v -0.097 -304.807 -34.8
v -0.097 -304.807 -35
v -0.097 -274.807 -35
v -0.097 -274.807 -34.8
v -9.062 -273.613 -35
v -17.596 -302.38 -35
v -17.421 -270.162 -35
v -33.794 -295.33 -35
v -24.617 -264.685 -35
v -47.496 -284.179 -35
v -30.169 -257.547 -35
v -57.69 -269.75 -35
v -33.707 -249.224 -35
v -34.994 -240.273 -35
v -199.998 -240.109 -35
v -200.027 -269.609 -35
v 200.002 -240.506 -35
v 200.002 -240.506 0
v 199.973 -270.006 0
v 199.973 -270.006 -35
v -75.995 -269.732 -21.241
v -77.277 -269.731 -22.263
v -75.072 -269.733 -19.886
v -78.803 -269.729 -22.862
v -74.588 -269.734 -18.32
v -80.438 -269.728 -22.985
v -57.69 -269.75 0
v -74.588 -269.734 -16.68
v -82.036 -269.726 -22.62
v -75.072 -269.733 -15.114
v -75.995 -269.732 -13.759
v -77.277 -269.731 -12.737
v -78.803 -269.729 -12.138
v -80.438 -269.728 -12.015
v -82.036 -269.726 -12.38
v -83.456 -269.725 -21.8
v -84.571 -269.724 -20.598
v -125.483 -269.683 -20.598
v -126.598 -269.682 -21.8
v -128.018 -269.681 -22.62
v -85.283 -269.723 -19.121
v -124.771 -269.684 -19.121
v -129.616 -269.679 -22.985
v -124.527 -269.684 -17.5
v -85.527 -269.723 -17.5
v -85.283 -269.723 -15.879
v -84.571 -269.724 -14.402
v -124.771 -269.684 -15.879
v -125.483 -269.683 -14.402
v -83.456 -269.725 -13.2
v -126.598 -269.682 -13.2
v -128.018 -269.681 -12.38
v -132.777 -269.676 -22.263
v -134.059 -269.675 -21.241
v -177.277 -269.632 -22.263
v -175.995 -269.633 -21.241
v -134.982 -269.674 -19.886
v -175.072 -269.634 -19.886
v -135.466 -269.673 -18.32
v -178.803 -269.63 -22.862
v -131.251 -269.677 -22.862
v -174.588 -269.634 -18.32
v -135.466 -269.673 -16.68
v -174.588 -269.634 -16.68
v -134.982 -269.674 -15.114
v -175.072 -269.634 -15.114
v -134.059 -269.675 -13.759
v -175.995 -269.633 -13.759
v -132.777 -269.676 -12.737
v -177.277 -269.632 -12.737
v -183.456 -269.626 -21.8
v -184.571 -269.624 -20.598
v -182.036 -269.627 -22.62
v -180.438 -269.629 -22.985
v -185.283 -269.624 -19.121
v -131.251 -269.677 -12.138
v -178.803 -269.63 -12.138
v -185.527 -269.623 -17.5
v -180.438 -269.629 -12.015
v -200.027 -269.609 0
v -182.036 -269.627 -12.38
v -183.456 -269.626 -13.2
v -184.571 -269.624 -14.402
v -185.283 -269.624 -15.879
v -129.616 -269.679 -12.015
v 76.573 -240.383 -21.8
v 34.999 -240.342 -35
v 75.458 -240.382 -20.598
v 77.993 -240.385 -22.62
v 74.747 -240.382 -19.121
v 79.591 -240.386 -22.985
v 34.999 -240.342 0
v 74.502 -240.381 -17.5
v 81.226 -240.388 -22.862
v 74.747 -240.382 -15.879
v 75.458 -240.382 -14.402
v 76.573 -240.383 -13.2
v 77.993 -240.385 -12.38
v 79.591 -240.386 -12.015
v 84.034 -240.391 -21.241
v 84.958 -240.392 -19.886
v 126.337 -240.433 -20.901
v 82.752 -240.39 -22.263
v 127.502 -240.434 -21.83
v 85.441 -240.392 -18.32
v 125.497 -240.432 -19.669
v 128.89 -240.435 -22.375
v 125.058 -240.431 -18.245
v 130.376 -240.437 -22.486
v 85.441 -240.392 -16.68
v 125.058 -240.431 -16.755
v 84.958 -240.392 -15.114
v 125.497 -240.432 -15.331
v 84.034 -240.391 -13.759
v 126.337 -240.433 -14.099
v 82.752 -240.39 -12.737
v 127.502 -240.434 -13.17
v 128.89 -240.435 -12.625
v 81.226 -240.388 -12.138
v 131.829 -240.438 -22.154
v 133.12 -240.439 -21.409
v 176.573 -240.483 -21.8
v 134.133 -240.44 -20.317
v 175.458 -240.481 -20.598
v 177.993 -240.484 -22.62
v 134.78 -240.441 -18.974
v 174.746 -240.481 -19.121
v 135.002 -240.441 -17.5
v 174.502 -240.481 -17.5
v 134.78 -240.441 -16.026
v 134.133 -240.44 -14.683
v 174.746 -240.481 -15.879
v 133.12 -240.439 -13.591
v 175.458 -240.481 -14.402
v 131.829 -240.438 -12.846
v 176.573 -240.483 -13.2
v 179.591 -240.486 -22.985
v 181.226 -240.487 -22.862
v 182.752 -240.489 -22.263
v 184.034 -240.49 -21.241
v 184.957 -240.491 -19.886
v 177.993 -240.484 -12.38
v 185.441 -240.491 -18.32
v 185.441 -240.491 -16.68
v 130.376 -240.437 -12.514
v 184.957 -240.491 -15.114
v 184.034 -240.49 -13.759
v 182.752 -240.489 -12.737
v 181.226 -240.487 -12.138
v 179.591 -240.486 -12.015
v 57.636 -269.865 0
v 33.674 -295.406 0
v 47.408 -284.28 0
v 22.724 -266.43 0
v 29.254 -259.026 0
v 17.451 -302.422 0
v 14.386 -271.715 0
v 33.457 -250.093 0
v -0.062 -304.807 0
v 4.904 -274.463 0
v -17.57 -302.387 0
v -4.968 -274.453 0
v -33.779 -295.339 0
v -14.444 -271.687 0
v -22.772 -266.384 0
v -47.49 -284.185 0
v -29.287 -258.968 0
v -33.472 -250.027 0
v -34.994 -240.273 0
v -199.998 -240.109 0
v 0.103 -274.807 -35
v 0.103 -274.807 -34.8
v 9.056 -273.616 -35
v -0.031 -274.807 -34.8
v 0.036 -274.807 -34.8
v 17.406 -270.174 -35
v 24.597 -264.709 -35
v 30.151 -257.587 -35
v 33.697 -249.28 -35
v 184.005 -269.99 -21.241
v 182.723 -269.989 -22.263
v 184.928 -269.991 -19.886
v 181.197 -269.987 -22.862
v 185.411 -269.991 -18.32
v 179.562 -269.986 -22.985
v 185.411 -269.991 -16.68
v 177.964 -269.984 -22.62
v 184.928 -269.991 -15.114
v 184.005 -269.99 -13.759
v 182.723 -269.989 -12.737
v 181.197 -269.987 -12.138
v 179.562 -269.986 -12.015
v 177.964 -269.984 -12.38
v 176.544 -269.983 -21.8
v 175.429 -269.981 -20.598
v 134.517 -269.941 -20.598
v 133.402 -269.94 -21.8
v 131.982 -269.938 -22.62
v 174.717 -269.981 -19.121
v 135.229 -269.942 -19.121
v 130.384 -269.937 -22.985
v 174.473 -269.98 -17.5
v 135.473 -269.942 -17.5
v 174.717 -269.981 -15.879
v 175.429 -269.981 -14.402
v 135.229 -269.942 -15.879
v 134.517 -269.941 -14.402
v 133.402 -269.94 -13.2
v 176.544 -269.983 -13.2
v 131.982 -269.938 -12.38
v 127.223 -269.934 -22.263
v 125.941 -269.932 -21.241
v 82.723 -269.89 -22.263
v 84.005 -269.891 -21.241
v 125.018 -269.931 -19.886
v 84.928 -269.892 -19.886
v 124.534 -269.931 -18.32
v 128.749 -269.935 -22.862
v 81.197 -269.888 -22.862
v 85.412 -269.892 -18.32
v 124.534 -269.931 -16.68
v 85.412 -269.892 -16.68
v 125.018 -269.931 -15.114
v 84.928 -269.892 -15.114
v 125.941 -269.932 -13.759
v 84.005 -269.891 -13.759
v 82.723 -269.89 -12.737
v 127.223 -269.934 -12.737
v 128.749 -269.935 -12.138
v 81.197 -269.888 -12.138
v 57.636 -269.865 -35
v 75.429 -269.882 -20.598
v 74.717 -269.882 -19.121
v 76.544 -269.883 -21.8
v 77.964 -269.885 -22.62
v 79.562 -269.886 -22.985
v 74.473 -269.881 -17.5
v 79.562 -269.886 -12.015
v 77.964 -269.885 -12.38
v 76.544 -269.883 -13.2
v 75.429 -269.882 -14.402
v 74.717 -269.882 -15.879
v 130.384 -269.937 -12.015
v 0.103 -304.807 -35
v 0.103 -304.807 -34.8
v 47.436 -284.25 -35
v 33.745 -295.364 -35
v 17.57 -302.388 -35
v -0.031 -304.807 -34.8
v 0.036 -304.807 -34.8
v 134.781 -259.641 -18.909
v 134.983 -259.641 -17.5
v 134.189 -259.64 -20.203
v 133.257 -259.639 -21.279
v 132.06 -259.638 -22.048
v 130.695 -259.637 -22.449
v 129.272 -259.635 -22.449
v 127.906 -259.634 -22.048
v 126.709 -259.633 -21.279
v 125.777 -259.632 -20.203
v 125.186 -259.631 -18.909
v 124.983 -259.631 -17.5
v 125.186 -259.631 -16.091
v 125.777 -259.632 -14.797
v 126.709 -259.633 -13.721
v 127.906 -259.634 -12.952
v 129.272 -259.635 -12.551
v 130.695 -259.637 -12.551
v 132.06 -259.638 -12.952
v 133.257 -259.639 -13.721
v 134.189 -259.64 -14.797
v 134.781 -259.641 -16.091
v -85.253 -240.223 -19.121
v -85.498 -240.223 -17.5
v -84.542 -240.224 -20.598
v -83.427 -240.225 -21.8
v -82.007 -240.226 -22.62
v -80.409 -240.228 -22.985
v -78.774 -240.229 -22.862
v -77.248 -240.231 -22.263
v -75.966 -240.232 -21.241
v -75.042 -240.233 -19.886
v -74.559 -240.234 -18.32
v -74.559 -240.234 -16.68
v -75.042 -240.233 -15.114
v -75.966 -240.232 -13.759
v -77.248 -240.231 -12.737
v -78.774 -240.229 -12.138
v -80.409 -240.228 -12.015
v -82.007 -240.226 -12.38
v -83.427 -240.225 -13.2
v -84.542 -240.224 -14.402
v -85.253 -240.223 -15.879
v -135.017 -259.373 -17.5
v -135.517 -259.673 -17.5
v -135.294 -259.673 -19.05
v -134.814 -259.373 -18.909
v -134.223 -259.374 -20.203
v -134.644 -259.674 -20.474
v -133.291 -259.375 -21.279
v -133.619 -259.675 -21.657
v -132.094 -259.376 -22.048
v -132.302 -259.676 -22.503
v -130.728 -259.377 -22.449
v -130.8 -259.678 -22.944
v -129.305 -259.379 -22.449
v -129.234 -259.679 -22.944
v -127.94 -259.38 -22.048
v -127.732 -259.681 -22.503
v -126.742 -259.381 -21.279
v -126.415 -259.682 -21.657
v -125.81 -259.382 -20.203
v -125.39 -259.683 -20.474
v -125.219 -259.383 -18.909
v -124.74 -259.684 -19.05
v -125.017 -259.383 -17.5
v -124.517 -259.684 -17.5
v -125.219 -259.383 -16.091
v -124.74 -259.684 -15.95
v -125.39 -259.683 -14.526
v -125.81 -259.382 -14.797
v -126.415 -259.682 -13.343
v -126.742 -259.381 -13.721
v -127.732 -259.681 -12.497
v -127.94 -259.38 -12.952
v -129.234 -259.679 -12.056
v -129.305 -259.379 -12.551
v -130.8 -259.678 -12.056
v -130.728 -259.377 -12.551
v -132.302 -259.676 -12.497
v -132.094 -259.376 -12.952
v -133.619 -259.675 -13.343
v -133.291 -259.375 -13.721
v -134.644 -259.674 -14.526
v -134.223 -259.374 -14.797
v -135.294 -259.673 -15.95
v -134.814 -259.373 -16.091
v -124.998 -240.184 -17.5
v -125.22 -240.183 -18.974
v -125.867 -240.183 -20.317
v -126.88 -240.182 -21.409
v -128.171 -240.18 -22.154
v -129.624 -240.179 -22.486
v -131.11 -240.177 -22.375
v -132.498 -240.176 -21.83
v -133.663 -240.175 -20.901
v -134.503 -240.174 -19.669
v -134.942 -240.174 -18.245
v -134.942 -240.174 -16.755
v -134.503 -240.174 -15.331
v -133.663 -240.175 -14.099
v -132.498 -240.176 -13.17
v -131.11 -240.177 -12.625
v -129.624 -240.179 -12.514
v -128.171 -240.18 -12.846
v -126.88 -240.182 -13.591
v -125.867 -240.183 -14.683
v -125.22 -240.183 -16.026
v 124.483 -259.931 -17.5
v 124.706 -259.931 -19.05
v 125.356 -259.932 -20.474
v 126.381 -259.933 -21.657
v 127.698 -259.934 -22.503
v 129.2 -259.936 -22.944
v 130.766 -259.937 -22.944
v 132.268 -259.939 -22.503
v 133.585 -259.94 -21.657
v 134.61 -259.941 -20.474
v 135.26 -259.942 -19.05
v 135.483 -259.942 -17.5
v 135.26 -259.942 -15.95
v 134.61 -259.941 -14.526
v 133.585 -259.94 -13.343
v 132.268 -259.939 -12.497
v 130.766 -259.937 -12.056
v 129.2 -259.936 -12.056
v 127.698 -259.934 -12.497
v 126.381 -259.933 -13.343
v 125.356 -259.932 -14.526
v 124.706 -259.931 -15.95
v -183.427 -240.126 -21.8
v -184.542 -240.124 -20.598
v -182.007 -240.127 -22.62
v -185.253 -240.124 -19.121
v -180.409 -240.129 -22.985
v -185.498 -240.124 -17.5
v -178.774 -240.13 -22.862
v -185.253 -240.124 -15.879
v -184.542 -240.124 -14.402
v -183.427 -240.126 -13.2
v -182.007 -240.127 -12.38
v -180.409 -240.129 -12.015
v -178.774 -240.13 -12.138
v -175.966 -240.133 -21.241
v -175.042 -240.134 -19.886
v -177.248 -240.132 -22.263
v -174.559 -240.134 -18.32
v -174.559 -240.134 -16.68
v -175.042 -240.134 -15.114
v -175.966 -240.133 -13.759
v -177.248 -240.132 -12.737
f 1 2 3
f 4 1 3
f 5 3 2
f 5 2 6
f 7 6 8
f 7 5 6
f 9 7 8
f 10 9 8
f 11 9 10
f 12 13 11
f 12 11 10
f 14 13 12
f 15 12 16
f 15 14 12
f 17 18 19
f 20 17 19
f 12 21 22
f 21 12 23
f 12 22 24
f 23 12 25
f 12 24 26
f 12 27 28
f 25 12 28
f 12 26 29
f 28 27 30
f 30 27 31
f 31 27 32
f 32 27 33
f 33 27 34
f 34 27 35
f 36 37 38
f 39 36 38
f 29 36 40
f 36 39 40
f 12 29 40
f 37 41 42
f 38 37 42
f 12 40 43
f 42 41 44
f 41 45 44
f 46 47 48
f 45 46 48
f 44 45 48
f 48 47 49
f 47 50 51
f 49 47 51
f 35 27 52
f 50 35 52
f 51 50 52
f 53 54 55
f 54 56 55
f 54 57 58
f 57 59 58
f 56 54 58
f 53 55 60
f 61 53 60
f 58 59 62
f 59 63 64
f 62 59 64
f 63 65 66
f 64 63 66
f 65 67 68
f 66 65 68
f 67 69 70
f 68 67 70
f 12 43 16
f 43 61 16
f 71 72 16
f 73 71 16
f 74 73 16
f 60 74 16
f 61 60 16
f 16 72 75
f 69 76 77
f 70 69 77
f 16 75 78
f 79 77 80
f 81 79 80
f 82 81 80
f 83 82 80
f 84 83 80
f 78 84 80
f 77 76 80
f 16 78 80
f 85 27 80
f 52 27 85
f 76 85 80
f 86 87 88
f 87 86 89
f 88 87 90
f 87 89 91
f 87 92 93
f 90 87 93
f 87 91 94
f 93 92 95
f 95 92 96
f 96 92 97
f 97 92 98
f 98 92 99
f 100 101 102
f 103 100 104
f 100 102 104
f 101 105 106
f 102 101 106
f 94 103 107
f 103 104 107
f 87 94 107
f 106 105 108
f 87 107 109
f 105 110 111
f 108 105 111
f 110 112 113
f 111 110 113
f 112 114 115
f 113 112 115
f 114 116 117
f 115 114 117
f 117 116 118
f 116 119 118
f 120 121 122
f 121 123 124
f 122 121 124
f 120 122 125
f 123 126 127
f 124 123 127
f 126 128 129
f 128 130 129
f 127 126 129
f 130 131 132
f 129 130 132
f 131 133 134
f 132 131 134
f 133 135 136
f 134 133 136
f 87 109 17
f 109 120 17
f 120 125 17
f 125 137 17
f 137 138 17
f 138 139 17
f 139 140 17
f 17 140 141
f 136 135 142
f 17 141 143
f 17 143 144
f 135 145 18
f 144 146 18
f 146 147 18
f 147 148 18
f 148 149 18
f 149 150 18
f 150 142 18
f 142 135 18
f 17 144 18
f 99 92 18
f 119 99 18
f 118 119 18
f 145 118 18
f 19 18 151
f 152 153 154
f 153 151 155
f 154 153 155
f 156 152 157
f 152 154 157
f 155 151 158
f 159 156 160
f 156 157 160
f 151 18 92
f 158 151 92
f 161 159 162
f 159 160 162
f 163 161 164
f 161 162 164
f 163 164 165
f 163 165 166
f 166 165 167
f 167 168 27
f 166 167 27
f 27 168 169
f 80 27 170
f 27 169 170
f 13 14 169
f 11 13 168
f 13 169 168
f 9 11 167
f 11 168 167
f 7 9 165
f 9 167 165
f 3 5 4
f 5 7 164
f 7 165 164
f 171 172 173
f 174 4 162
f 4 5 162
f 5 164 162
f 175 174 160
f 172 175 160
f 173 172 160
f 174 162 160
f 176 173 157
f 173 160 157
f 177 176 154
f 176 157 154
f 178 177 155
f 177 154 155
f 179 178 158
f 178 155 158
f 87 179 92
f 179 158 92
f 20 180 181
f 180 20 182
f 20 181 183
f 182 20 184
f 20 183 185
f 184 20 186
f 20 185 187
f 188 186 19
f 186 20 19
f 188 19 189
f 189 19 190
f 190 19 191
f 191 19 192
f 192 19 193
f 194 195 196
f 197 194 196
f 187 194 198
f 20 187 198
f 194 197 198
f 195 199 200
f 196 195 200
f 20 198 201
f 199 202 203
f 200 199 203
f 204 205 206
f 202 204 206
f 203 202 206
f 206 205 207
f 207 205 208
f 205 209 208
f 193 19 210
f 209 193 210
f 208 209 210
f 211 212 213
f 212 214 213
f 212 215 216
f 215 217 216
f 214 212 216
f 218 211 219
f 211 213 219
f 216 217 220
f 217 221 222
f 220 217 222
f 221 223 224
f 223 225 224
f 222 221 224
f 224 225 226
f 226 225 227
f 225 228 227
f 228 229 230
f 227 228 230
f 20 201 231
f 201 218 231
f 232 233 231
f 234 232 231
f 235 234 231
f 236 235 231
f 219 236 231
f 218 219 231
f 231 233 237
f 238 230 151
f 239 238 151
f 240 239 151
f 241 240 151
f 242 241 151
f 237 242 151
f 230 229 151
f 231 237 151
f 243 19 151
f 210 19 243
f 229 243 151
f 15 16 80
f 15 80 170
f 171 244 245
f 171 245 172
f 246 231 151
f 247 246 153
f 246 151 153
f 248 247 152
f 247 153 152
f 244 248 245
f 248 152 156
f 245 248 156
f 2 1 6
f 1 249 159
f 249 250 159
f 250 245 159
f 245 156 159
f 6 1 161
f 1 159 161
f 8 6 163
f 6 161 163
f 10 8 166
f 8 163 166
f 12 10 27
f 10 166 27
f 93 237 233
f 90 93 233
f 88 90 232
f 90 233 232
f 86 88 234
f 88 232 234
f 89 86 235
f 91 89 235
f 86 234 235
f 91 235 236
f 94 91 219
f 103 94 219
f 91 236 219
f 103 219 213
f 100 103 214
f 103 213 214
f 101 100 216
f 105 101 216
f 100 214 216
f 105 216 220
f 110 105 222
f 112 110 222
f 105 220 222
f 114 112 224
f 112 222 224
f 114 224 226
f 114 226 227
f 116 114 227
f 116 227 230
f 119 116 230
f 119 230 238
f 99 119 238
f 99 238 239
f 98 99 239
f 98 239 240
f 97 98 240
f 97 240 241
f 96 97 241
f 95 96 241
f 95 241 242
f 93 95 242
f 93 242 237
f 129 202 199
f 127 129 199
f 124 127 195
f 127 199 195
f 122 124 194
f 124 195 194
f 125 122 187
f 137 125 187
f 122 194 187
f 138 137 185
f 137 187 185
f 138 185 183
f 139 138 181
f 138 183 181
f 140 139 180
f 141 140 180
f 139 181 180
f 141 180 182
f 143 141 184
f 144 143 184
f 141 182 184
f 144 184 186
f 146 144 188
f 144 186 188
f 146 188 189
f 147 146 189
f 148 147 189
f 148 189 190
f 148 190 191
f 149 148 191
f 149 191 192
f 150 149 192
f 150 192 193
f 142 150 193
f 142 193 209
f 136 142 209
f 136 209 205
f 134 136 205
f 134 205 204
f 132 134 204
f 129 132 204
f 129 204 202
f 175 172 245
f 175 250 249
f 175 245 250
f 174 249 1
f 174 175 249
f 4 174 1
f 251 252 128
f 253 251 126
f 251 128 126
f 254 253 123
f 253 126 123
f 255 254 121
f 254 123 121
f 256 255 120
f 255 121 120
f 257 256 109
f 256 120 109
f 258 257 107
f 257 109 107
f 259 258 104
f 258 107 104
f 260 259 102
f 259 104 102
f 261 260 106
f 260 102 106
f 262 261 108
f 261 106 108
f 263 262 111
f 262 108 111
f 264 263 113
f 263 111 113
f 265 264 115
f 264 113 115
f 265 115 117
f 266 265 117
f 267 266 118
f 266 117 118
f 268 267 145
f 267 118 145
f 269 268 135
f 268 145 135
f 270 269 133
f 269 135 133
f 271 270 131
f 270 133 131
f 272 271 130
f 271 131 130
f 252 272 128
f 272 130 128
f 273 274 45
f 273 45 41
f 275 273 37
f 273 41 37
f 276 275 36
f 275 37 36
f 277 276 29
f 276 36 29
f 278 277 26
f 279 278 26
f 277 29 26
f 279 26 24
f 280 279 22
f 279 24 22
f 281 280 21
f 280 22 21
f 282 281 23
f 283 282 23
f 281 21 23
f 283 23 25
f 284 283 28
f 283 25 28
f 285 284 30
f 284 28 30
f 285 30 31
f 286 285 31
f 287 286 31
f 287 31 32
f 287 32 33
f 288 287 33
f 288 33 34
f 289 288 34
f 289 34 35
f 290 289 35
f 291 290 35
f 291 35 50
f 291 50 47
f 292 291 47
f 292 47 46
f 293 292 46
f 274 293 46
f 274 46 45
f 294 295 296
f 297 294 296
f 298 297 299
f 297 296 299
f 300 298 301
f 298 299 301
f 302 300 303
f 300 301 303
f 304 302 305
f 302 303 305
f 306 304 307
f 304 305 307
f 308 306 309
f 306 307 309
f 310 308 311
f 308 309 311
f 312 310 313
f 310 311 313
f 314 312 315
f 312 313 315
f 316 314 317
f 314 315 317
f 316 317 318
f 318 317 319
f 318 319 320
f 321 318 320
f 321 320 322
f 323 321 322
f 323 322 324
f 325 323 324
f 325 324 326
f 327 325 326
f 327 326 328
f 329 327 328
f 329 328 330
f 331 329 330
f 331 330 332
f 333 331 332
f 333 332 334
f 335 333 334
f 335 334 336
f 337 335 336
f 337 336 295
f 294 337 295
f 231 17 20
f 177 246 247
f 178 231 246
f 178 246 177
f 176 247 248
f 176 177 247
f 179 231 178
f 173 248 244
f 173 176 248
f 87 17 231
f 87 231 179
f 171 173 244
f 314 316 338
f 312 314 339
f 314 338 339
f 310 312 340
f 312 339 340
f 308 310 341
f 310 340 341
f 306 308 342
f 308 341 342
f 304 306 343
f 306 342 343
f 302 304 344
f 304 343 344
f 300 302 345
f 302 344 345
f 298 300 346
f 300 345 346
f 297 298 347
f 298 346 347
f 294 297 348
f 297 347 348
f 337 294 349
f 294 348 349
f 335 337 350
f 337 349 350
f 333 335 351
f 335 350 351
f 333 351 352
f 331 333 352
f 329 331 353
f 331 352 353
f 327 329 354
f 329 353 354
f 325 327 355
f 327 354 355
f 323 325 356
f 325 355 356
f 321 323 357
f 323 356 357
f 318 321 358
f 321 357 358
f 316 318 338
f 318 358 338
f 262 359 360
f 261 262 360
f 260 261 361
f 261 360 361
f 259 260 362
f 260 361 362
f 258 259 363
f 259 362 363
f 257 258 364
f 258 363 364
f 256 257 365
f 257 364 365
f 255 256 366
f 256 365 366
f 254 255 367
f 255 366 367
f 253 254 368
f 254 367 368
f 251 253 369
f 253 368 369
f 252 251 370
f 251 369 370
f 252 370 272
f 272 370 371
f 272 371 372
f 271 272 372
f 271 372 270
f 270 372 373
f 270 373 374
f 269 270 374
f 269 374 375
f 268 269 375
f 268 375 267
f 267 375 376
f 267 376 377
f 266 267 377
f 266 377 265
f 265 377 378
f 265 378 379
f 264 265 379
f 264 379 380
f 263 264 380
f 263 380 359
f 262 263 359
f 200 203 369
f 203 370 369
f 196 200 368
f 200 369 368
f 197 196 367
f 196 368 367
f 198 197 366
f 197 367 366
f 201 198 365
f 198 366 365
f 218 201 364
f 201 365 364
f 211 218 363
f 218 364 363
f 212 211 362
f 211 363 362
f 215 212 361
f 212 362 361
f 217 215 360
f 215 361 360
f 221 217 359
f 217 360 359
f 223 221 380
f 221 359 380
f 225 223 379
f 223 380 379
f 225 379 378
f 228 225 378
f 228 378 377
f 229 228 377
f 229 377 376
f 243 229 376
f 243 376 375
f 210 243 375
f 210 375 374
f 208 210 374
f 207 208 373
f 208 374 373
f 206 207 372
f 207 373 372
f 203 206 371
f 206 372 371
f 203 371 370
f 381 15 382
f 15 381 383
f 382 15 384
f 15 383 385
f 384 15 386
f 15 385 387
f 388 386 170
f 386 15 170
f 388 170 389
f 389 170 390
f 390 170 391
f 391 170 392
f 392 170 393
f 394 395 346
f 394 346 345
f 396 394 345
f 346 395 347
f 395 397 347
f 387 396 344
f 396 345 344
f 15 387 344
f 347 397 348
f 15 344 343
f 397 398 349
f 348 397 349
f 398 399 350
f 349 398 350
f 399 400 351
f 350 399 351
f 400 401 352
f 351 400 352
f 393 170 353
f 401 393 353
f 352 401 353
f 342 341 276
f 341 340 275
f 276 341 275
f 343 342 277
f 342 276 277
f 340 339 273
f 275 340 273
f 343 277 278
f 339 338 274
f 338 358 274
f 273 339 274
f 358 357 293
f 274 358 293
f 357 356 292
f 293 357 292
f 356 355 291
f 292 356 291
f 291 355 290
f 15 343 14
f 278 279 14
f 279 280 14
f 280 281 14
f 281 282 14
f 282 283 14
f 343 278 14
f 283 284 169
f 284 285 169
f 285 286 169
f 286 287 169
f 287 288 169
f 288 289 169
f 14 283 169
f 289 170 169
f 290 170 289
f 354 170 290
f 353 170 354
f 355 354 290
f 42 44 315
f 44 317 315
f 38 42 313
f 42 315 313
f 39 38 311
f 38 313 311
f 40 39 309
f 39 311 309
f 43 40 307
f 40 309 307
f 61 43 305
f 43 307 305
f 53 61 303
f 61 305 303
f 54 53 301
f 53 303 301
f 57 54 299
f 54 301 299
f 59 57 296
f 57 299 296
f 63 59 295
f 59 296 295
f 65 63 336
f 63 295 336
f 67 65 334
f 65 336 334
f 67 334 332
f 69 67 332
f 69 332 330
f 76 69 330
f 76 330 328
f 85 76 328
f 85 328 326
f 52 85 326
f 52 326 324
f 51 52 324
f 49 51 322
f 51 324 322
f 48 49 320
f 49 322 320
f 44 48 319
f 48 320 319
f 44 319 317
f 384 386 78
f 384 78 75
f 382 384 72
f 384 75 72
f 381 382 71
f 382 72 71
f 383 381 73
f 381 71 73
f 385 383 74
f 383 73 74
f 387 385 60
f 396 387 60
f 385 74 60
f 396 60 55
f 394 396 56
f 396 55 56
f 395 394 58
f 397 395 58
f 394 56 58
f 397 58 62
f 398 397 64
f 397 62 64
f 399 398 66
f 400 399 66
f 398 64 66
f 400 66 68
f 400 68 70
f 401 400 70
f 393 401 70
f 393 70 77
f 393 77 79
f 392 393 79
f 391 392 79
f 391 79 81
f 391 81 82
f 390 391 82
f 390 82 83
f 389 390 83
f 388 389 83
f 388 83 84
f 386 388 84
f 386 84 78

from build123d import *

# Parameters (mm, degrees)
RESSALTO_EXTRUS_O1_DEPTH         = 35
FURO_DE_DI_METRO_11_0_11_1_D     = 11
FUROS_GUIA_COM_10_0MM1_D         = 10
FURO_DE_DI_METRO_11_0_11_2_D     = 11
FURO_DE_DI_METRO_11_0_11_2_DEPTH = 10
FURO_DE_DI_METRO_11_0_11_2_TIP   = 3.304733405
ESBO_O8_W                        = 0.2
ESBO_O8_H                        = 36.606458827
CORTE_EXTRUS_O1_DEPTH            = 0.2


with BuildPart() as part:
    # Esboço1 → Ressalto-extrusão1 (new body)
    with BuildSketch(Plane.XY):
        with BuildLine():
            Line((-199.997669575, -240.109131808), (-34.994179097, -240.27276126))
            ThreePointArc((-34.994179097, -240.27276126), (-0.031980607, -274.807449281), (34.998643265, -240.34217123))
            Line((34.998643265, -240.34217123), (200.002133743, -240.505800682))
            Line((200.002133743, -240.505800682), (199.972879413, -270.005786177))
            Line((199.972879413, -270.005786177), (57.635762375, -269.864634348))
            ThreePointArc((57.635762375, -269.864634348), (-0.061730772, -304.80743453), (-57.689806866, -269.750269132))
            Line((-57.689806866, -269.750269132), (-200.026923904, -269.609117302))
            Line((-200.026923904, -269.609117302), (-199.997669575, -240.109131808))
        make_face()
    extrude(amount=-RESSALTO_EXTRUS_O1_DEPTH)

    # Furo de diâmetro Ø11.0 (11)1 (through all)
    with Locations(Plane(origin=(-0.238306111, -240.30722771, 0), x_dir=(0.9999995082930158, -0.000991672187112085, 0), z_dir=(0.000991672187112085, 0.9999995082930158, 0))):
        with Locations((-179.759461687, 17.5), (-79.759461687, 17.5), (80.240538313, 17.5), (180.240538313, 17.5)):
            Hole(FURO_DE_DI_METRO_11_0_11_1_D / 2)

    # Furos-guia com Ø10.0mm1 (through all)
    with Locations(Plane(origin=(-0.267560441, -269.807213205, 0), x_dir=(-0.9999995082930158, 0.0009916721871120312, 0), z_dir=(-0.0009916721871120312, -0.9999995082930158, 0))):
        with Locations((129.759461687, 17.5), (-130.240538313, 17.5), (-221.181262437, -155.418379851)):
            Hole(FUROS_GUIA_COM_10_0MM1_D / 2)

    # Furo de diâmetro Ø11.0 (11)2
    with Locations(Plane(origin=(-0.267560441, -269.807213205, 0), x_dir=(-0.9999995082930158, 0.0009916721871120312, 0), z_dir=(-0.0009916721871120312, -0.9999995082930158, 0))):
        with Locations((129.759461687, 17.5), (-130.240538313, 17.5)):
            Hole(FURO_DE_DI_METRO_11_0_11_2_D / 2, depth=FURO_DE_DI_METRO_11_0_11_2_DEPTH)
            with Locations((0, 0, -(FURO_DE_DI_METRO_11_0_11_2_DEPTH + FURO_DE_DI_METRO_11_0_11_2_TIP / 2))):  # 118° drill point
                Cone(0, FURO_DE_DI_METRO_11_0_11_2_D / 2, FURO_DE_DI_METRO_11_0_11_2_TIP, mode=Mode.SUBTRACT)

    # Esboço8 → Corte-extrusão1 (cut)
    with BuildSketch(Plane(origin=(0, 0, -35), x_dir=(-1, 0, 0), z_dir=(0, 0, -1))):
        with Locations((-0.00272792, -289.800051975)):
            Rectangle(ESBO_O8_W, ESBO_O8_H)
    extrude(amount=-CORTE_EXTRUS_O1_DEPTH, mode=Mode.SUBTRACT)


solid = part.part
